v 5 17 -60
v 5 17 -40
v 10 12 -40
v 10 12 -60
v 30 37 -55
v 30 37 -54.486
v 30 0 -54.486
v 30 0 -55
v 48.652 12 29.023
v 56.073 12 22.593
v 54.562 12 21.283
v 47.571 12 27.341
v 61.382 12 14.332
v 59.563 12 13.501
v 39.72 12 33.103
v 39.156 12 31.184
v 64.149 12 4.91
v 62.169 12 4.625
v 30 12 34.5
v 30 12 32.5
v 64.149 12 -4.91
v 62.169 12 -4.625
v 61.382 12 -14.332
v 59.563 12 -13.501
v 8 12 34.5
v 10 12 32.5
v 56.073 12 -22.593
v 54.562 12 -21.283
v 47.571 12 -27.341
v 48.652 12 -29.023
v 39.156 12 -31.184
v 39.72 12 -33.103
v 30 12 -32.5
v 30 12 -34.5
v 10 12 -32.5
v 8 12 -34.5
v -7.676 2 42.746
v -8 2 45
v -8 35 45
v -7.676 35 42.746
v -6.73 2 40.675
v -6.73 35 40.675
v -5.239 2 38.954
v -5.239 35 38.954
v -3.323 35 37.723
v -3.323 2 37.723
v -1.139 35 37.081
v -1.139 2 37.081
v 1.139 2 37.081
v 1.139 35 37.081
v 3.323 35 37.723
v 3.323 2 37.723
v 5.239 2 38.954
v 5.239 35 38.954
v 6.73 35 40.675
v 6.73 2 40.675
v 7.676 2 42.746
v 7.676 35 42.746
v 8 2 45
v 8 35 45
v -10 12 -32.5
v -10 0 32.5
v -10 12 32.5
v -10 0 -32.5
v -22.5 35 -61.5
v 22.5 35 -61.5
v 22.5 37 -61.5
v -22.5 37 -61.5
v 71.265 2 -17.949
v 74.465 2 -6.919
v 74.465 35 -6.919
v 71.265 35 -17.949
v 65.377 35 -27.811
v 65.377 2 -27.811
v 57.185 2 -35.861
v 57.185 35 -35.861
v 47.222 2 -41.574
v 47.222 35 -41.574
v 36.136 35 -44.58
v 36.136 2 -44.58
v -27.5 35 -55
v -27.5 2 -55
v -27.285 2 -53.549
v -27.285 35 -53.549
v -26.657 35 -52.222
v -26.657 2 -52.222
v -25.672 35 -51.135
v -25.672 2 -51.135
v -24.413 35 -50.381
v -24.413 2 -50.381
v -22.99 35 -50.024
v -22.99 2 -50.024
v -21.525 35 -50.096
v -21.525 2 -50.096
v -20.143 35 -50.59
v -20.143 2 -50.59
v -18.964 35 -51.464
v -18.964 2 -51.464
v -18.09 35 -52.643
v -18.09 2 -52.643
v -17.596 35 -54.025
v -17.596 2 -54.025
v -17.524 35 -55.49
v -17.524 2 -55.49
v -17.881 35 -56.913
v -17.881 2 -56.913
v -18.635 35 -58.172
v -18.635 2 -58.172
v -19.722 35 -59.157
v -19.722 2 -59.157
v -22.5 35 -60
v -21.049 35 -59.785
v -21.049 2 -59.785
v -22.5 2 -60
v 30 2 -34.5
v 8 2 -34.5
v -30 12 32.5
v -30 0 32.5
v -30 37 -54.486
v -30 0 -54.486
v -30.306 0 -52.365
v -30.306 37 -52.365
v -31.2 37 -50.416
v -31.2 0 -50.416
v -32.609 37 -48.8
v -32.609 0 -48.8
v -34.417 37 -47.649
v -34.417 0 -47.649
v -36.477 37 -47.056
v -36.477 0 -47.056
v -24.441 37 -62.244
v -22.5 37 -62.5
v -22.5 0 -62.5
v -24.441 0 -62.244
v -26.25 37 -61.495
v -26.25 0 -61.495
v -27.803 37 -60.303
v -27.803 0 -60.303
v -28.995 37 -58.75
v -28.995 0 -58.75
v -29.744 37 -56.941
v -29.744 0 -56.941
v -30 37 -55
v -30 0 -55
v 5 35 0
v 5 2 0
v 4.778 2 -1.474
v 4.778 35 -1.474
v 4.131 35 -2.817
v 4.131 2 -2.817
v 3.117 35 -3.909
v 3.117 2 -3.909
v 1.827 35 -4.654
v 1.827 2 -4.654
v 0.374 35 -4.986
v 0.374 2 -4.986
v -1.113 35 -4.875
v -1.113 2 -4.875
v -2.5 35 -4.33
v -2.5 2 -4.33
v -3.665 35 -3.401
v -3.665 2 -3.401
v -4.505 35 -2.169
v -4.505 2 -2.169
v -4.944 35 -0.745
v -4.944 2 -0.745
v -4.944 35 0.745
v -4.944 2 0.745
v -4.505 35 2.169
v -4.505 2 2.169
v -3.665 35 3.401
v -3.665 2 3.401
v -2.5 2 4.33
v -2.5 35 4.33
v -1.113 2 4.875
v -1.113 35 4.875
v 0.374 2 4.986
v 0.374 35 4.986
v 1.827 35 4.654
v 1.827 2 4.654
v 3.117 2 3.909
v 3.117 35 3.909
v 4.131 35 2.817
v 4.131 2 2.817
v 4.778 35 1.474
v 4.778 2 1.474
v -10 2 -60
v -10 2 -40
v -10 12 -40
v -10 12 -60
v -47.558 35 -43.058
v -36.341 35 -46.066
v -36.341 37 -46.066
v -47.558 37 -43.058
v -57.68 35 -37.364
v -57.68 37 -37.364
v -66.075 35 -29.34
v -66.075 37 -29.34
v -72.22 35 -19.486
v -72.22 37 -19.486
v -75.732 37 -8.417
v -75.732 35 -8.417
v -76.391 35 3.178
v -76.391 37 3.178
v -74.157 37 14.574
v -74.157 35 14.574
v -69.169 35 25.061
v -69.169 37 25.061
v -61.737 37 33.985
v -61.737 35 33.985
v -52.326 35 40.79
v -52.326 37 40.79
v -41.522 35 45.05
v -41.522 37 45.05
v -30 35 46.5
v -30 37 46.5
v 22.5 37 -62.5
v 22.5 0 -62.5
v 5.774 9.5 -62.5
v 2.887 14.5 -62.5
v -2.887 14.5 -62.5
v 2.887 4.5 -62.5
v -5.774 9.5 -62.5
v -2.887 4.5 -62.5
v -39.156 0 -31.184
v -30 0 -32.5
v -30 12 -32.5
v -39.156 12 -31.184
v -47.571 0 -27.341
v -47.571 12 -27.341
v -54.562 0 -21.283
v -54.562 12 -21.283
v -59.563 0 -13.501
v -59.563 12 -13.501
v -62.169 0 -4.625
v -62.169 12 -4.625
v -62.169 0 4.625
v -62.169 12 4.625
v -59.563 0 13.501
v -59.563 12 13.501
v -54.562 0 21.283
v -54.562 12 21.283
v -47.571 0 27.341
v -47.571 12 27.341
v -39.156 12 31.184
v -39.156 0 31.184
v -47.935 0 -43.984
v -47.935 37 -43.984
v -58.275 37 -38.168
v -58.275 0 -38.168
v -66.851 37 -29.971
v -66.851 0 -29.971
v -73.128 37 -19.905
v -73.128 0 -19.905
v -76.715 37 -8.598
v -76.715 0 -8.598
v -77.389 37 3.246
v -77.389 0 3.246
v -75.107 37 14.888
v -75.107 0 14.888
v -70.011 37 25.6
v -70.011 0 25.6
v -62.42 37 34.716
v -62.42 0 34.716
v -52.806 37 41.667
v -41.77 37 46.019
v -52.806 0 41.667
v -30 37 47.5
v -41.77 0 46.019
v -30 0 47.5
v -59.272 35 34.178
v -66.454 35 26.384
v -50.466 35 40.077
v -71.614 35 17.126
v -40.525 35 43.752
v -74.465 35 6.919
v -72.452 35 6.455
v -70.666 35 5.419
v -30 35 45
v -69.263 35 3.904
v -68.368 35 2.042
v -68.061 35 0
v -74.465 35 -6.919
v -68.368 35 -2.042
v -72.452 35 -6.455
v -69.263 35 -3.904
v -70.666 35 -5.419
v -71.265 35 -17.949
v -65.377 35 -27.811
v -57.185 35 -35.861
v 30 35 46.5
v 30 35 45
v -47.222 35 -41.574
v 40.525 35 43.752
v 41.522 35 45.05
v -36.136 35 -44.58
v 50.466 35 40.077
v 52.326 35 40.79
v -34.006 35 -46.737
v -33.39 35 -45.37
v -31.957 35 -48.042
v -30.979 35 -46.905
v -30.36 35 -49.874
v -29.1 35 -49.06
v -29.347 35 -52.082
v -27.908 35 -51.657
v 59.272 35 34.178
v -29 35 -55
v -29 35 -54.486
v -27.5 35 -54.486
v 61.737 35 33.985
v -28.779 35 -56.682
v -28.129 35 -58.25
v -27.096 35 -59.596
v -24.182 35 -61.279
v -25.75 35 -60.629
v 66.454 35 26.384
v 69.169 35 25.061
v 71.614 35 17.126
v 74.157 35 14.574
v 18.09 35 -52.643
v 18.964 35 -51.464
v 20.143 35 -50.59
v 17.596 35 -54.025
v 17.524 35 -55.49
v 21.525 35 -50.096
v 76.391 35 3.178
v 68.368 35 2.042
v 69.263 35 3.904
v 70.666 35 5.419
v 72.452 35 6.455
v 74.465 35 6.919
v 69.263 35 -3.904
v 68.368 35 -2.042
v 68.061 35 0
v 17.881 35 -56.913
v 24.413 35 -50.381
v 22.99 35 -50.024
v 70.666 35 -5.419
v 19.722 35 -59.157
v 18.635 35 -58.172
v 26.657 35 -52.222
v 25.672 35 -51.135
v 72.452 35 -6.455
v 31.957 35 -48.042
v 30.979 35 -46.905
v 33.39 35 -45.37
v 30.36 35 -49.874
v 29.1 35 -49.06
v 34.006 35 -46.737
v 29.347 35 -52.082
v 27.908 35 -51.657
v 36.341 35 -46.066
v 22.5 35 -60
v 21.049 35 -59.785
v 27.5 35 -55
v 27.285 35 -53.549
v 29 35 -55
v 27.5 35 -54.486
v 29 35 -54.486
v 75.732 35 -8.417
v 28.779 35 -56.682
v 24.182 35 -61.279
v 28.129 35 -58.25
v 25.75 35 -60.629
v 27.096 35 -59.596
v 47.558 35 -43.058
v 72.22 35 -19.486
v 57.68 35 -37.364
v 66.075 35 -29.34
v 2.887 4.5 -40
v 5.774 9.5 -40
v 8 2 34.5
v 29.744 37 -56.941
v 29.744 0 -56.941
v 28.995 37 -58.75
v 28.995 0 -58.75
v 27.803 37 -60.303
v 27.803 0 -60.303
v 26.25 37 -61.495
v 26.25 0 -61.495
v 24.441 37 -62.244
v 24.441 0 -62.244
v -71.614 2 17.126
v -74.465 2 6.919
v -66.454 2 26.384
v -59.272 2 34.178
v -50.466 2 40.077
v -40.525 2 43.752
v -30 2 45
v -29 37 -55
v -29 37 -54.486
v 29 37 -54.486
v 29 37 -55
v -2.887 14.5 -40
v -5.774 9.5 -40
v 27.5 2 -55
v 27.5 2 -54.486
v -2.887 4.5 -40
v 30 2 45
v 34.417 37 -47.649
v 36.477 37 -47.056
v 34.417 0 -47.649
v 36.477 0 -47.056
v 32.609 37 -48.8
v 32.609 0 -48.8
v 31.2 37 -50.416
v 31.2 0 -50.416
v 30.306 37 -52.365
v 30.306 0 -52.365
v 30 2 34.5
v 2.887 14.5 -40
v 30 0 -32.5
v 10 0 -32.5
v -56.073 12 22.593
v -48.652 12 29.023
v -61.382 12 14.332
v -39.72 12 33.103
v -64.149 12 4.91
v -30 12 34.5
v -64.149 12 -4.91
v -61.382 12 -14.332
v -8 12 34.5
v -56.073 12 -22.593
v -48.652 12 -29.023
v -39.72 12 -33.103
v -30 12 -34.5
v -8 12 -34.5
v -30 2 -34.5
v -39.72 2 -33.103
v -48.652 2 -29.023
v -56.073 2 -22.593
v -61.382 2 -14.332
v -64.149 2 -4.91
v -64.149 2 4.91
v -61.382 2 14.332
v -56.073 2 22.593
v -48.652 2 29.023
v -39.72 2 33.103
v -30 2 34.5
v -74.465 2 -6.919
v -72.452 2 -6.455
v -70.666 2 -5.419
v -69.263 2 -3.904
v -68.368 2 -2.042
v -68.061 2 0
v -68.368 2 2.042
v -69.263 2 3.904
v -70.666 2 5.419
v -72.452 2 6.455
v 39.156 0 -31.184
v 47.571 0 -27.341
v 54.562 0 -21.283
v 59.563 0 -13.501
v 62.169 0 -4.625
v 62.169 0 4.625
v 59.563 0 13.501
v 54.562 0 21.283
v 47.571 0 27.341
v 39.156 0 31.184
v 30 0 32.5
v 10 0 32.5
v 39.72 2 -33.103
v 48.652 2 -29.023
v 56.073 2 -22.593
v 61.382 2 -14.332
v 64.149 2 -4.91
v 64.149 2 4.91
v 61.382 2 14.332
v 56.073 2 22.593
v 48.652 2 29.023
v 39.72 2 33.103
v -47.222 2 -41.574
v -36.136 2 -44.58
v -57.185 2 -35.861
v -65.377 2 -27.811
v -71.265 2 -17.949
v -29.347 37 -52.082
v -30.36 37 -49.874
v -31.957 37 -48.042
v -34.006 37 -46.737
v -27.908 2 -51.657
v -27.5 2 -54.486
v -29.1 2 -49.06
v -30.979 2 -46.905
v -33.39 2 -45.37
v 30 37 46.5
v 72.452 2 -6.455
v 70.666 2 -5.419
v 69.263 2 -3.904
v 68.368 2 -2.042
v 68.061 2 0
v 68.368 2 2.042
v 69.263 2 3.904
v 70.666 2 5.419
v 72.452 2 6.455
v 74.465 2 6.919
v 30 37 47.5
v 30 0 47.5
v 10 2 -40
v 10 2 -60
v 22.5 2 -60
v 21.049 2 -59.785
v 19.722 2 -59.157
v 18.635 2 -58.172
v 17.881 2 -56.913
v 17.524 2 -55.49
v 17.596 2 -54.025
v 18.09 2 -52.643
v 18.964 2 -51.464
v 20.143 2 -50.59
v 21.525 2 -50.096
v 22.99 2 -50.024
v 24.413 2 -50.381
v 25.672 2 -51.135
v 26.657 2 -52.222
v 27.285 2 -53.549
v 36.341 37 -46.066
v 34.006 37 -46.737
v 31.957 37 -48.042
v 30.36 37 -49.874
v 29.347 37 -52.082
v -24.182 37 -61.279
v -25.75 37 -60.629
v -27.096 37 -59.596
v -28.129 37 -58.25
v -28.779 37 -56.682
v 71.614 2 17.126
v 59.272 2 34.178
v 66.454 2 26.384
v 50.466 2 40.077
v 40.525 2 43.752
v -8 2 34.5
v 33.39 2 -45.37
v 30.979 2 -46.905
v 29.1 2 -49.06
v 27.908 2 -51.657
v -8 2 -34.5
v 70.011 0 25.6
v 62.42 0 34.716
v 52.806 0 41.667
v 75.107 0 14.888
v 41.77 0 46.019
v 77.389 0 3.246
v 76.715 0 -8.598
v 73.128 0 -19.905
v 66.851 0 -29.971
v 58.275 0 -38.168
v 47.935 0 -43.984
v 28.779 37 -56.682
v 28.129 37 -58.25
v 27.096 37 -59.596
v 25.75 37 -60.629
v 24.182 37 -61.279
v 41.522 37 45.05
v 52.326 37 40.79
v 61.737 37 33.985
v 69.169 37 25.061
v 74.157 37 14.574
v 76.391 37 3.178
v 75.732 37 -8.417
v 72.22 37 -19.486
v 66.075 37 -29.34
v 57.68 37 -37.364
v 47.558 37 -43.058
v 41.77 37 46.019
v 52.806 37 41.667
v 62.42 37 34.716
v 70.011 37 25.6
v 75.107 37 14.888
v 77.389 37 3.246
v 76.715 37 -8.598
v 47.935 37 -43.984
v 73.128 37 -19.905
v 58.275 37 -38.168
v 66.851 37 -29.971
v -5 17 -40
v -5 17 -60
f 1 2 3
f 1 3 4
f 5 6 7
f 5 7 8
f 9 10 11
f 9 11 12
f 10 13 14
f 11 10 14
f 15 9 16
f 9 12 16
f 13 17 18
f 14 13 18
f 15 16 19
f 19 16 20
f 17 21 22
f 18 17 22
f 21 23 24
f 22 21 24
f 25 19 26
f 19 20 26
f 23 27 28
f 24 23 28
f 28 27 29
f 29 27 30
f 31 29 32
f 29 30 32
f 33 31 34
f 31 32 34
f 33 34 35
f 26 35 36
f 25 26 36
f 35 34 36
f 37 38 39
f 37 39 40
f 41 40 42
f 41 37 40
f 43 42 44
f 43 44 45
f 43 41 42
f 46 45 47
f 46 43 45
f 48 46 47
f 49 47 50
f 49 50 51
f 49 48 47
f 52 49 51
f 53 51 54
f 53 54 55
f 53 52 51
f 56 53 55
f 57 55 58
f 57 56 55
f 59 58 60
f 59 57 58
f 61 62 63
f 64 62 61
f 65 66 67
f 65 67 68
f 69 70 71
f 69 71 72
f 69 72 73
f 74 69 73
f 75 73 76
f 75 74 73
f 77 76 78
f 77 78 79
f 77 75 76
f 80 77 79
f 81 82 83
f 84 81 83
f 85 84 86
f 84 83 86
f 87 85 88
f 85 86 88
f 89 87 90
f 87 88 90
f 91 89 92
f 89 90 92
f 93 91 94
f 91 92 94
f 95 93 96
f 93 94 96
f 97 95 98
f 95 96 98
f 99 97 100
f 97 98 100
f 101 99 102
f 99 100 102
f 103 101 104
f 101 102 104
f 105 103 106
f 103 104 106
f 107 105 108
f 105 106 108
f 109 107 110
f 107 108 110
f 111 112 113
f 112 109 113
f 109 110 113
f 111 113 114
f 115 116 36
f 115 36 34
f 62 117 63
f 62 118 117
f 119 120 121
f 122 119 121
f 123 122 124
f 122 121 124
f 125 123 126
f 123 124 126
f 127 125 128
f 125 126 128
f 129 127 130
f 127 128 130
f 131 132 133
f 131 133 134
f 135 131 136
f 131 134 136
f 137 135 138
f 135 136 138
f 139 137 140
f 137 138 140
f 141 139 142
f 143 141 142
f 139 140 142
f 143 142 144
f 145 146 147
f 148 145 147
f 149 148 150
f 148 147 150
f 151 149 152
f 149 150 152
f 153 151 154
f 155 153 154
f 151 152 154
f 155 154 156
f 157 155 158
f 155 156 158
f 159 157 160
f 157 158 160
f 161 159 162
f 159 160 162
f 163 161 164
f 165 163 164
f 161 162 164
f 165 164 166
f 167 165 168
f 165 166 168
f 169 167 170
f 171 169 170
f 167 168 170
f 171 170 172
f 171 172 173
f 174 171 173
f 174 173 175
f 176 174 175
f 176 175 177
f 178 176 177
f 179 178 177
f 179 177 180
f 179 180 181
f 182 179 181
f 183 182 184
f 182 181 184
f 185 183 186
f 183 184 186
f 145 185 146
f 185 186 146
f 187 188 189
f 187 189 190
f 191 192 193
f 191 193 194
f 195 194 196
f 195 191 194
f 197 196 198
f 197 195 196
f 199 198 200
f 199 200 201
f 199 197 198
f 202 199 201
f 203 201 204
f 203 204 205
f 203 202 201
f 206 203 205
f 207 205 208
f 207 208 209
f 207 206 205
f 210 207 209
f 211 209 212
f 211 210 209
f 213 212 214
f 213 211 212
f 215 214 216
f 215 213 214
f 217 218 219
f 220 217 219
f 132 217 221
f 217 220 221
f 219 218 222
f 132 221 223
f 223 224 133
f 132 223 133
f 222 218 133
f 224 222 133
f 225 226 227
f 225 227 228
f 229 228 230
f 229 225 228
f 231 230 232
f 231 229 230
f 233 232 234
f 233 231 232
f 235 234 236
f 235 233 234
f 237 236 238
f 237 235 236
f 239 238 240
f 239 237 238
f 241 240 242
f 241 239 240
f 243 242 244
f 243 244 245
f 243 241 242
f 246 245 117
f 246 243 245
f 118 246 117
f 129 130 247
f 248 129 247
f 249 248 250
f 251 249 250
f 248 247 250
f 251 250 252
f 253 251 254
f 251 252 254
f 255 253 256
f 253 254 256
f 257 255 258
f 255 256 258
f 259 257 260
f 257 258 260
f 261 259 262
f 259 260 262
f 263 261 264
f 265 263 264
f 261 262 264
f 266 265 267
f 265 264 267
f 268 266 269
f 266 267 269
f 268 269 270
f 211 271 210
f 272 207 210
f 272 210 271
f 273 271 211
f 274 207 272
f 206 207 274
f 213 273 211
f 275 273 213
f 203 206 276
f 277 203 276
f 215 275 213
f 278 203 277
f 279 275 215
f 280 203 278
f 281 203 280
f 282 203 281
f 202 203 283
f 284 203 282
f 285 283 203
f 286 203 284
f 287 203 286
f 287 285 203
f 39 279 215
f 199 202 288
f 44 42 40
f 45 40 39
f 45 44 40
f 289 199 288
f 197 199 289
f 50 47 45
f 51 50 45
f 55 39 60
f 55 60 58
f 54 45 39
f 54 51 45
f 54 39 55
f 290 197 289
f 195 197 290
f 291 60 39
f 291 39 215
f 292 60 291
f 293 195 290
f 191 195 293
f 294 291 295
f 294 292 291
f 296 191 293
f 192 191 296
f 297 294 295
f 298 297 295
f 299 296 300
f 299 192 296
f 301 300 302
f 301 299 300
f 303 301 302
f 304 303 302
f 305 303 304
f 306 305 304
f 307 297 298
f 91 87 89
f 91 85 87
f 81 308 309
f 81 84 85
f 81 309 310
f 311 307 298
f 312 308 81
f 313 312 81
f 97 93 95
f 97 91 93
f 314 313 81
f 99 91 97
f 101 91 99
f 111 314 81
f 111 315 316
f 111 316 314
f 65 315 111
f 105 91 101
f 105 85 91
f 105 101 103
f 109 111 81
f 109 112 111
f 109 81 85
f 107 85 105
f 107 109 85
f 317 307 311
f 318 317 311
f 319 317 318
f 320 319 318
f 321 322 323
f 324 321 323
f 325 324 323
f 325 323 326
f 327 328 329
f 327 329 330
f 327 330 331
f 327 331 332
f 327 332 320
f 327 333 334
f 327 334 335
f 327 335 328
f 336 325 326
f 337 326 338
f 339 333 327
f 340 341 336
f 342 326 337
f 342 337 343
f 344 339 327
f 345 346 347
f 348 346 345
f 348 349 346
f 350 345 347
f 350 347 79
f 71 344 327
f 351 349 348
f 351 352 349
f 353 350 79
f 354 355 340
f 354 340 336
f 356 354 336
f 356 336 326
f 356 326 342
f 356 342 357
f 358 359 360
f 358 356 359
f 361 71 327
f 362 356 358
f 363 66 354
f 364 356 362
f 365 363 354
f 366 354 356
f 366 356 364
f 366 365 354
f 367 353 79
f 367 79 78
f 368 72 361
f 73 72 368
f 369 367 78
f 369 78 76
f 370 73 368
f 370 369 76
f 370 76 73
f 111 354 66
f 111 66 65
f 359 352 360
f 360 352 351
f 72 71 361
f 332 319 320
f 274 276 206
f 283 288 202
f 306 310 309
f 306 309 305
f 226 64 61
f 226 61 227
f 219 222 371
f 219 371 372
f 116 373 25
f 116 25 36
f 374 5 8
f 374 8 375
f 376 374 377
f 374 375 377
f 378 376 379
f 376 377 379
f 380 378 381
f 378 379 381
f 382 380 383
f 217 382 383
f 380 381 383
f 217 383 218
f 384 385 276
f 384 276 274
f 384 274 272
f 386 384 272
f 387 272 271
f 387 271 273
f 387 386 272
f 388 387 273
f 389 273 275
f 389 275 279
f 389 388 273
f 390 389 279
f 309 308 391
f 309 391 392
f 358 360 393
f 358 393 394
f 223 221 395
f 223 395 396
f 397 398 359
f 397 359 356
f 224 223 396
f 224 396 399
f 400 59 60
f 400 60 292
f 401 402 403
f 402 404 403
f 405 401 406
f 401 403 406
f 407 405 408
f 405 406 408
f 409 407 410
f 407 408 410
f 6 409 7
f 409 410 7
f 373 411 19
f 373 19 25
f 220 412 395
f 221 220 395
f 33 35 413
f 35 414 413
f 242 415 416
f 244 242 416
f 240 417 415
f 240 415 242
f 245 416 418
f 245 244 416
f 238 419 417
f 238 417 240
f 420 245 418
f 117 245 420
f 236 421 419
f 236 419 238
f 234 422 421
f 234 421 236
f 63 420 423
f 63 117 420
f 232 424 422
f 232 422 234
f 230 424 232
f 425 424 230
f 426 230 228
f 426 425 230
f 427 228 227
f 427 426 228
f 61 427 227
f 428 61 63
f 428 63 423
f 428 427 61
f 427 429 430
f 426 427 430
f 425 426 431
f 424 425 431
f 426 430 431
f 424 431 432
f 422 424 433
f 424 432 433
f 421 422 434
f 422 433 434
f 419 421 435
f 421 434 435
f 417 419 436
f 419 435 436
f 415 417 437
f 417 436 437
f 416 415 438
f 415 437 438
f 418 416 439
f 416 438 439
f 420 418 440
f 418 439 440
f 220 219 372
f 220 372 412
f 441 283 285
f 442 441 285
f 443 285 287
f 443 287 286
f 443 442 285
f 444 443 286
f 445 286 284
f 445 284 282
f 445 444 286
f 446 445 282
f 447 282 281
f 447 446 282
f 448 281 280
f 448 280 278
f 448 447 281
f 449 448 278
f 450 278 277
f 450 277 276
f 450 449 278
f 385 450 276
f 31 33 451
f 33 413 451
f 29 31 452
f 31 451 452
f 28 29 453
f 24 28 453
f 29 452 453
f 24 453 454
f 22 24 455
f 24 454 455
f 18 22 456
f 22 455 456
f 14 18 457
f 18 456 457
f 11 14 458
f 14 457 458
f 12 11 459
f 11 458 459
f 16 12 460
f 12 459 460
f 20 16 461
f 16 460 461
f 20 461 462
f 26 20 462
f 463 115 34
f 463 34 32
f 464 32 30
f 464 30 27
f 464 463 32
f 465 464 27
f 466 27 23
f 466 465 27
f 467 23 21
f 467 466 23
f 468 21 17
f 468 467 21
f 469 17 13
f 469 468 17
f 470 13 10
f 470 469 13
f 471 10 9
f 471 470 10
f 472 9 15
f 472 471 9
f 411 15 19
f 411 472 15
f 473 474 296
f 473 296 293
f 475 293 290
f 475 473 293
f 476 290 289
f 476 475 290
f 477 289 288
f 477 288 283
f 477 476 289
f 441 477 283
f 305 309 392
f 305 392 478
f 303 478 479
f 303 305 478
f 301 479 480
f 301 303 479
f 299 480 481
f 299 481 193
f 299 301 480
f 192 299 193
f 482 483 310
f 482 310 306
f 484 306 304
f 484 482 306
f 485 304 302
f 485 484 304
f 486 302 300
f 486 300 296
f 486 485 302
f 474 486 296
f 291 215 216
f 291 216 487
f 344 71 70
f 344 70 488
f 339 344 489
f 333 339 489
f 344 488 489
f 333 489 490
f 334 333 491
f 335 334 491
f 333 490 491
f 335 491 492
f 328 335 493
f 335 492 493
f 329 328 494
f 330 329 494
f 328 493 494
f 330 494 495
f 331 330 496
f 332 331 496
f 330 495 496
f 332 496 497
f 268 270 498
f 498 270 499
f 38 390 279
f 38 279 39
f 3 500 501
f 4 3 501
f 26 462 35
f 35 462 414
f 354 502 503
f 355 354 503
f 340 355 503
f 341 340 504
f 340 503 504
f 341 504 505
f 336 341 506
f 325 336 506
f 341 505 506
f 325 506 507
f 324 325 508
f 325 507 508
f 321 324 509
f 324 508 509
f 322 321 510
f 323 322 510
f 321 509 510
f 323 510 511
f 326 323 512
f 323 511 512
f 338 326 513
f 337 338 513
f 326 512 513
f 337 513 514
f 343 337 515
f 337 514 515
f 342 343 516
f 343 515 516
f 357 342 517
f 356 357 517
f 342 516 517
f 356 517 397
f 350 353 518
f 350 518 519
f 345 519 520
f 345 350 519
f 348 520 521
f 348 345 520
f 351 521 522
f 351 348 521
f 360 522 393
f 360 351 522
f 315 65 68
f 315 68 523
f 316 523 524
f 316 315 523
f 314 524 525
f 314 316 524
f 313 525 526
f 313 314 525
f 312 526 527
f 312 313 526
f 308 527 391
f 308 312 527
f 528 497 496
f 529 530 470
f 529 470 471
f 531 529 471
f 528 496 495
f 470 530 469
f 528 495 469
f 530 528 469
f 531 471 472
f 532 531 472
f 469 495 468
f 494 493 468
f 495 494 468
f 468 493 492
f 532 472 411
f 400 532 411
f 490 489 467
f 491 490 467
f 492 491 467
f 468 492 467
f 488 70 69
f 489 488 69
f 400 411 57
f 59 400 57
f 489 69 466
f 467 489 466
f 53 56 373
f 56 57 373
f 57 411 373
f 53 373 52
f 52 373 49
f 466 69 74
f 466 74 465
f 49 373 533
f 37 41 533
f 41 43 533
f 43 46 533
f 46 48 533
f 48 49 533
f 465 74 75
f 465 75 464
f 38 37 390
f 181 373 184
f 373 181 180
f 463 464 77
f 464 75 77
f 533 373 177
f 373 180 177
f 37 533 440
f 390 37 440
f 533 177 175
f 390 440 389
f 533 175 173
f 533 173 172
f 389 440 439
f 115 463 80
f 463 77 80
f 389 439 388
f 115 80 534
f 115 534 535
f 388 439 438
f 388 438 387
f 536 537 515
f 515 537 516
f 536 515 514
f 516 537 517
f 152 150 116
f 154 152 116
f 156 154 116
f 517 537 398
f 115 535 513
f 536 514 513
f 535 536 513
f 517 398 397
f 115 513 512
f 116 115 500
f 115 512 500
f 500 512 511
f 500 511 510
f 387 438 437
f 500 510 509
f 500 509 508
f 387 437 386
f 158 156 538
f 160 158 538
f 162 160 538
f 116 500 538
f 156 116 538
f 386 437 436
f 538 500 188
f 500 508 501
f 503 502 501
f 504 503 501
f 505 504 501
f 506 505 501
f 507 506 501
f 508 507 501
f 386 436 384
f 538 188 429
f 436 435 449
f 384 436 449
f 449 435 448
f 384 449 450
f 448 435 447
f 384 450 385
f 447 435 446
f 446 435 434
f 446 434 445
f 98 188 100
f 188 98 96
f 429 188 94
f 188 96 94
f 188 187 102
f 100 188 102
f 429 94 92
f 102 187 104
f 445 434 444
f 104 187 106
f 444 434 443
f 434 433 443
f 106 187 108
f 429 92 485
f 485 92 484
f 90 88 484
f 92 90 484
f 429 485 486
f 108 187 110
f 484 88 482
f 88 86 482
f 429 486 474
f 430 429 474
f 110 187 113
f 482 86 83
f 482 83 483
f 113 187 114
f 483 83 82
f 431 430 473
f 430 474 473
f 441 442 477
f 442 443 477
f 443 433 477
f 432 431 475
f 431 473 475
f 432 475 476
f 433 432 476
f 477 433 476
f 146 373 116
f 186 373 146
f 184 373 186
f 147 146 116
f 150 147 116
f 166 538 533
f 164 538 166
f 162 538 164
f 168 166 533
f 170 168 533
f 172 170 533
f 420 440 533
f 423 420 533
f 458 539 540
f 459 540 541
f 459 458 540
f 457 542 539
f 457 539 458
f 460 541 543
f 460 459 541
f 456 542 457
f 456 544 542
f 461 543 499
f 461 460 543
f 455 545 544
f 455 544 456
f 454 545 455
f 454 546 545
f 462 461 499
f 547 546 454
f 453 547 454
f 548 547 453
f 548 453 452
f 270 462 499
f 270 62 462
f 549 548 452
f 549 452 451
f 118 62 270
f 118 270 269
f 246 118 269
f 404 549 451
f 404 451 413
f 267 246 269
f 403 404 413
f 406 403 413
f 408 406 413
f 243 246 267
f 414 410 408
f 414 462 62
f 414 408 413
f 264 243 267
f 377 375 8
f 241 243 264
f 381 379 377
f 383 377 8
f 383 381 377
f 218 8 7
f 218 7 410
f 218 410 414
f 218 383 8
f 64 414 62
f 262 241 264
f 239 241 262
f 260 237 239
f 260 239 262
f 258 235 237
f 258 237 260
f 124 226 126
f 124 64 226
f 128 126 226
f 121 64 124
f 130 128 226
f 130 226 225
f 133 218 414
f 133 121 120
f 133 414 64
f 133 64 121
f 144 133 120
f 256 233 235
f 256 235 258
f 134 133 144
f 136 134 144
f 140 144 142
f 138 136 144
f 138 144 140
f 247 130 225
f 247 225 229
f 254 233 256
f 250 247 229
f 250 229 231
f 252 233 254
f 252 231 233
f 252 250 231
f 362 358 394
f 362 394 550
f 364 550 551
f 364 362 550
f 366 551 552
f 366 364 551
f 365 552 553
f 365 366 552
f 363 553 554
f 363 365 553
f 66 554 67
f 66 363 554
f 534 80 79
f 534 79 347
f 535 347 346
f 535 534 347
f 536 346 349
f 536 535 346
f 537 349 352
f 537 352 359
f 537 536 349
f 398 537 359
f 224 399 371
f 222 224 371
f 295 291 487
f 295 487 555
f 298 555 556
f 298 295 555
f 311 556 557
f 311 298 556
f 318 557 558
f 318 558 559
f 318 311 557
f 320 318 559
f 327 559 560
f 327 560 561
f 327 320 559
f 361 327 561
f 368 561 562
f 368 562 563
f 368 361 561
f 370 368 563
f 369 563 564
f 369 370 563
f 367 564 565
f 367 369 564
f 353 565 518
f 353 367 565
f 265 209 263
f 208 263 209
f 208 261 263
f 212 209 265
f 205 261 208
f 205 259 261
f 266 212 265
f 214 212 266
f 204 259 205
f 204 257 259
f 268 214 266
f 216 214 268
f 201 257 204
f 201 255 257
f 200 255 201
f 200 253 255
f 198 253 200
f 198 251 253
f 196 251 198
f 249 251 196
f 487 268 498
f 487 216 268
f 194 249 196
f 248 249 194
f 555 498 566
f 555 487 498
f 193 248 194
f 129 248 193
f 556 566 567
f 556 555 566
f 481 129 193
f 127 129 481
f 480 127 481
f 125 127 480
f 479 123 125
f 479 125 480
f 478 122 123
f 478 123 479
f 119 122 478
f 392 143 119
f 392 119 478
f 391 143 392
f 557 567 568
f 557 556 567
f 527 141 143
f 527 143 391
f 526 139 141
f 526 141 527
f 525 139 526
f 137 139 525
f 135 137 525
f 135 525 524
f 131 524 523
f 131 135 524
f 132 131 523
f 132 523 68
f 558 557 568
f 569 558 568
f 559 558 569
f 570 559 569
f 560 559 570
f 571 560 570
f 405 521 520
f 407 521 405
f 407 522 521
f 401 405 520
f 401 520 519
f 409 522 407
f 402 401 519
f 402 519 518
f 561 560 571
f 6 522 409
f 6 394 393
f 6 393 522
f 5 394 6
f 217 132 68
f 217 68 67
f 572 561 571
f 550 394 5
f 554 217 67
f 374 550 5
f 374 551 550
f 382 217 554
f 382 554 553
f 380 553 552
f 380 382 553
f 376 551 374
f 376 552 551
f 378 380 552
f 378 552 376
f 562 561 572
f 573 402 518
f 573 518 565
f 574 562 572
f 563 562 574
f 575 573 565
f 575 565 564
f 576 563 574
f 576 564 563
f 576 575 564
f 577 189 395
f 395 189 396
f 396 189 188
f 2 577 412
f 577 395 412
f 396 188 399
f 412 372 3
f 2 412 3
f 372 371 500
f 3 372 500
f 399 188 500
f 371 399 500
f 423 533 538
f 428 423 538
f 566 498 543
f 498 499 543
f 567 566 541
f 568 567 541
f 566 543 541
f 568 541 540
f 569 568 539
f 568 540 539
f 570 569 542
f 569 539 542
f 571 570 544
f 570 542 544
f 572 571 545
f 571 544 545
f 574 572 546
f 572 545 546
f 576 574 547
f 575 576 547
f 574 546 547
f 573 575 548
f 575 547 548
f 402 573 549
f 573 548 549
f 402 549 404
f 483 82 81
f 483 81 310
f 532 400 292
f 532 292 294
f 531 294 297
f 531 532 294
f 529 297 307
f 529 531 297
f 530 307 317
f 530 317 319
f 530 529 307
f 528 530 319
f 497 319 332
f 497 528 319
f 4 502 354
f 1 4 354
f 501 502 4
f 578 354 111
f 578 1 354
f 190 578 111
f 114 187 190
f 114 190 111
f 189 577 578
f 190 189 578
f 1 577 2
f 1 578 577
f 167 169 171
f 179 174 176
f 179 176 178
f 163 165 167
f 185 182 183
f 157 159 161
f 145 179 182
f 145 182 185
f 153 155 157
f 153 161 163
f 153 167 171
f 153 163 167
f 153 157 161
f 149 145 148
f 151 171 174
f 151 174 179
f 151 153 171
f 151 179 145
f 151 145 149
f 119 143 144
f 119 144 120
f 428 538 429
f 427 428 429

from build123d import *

# Parameters (mm, degrees)
BOSS_EXTRUDE1_DEPTH = 2
EXTRUDE_THIN1_DEPTH = 35
EXTRUDE_THIN3_DEPTH = 10
EXTRUDE_THIN4_DEPTH = 33
BOSS_EXTRUDE4_DEPTH = 33
BOSS_EXTRUDE5_DEPTH = 33
SKETCH12_R          = 5
BOSS_EXTRUDE7_DEPTH = 33
SKETCH13_W          = 20
SKETCH13_H          = 20
BOSS_EXTRUDE8_DEPTH = 15
CUT_EXTRUDE1_DEPTH  = 28
CHAMFER2_SIZE       = 5
SKETCH17_R          = 5
BOSS_EXTRUDE9_DEPTH = 33


with BuildPart() as part:
    # Sketch1 → Boss-Extrude1 (new body)
    with BuildSketch(Plane(origin=(0, 0, 0), x_dir=(1, 0, 0), z_dir=(0, 1, 0))):
        with BuildLine():
            Line((-30, 54.486236794), (-30, 55))
            ThreePointArc((-30, 55), (-27.803300859, 60.303300859), (-22.5, 62.5))
            Line((-22.5, 62.5), (22.5, 62.5))
            ThreePointArc((22.5, 62.5), (27.803300859, 60.303300859), (30, 55))
            Line((30, 55), (30, 54.486236794))
            ThreePointArc((30, 54.486236794), (31.846662289, 49.557771239), (36.477272727, 47.056295413))
            ThreePointArc((36.477272727, 47.056295413), (77.388944028, -3.246226107), (30, -47.5))
            Line((30, -47.5), (-30, -47.5))
            ThreePointArc((-30, -47.5), (-77.388944028, -3.246226107), (-36.477272727, 47.056295413))
            ThreePointArc((-36.477272727, 47.056295413), (-31.846662289, 49.557771239), (-30, 54.486236794))
        make_face()
        with BuildLine():
            Line((-30, 32.5), (-10, 32.5))
            Line((-10, 32.5), (-10, -32.5))
            Line((-10, -32.5), (-30, -32.5))
            ThreePointArc((-30, -32.5), (-62.5, 0), (-30, 32.5))
        make_face(mode=Mode.SUBTRACT)
        with BuildLine():
            Line((10, 32.5), (30, 32.5))
            ThreePointArc((30, 32.5), (62.5, 0), (30, -32.5))
            Line((30, -32.5), (10, -32.5))
            Line((10, -32.5), (10, 32.5))
        make_face(mode=Mode.SUBTRACT)
    extrude(amount=BOSS_EXTRUDE1_DEPTH)

    # Sketch2 → Extrude-Thin1 (add)
    with BuildSketch(Plane(origin=(0, 2, 0), x_dir=(1, 0, 0), z_dir=(0, 1, 0))):
        with BuildLine():
            Line((-30, -47.5), (30, -47.5))
            ThreePointArc((30, -47.5), (77.388944028, -3.246226107), (36.477272727, 47.056295413))
            ThreePointArc((36.477272727, 47.056295413), (31.846662289, 49.557771239), (30, 54.486236794))
            Line((30, 54.486236794), (30, 55))
            ThreePointArc((30, 55), (27.803300859, 60.303300859), (22.5, 62.5))
            Line((22.5, 62.5), (-22.5, 62.5))
            ThreePointArc((-22.5, 62.5), (-27.803300859, 60.303300859), (-30, 55))
            Line((-30, 55), (-30, 54.486236794))
            ThreePointArc((-30, 54.486236794), (-31.846662289, 49.557771239), (-36.477272727, 47.056295413))
            ThreePointArc((-36.477272727, 47.056295413), (-77.388944028, -3.246226107), (-30, -47.5))
        make_face()
        with BuildLine():
            Line((-30, -46.5), (30, -46.5))
            ThreePointArc((30, -46.5), (76.391282048, -3.177884504), (36.340909091, 46.065636562))
            ThreePointArc((36.340909091, 46.065636562), (31.092883928, 48.900642499), (29, 54.486236794))
            Line((29, 54.486236794), (29, 55))
            ThreePointArc((29, 55), (27.096194078, 59.596194078), (22.5, 61.5))
            Line((22.5, 61.5), (-22.5, 61.5))
            ThreePointArc((-22.5, 61.5), (-27.096194078, 59.596194078), (-29, 55))
            Line((-29, 55), (-29, 54.486236794))
            ThreePointArc((-29, 54.486236794), (-31.092883928, 48.900642499), (-36.340909091, 46.065636562))
            ThreePointArc((-36.340909091, 46.065636562), (-76.391282048, -3.177884504), (-30, -46.5))
        make_face(mode=Mode.SUBTRACT)
    extrude(amount=EXTRUDE_THIN1_DEPTH)

    # Sketch5 → Extrude-Thin3 (add)
    with BuildSketch(Plane(origin=(0, 2, 0), x_dir=(1, 0, 0), z_dir=(0, 1, 0))):
        with BuildLine():
            Line((30, -34.5), (8, -34.5))
            Line((8, -34.5), (8, 34.5))
            Line((8, 34.5), (30, 34.5))
            ThreePointArc((30, 34.5), (64.5, 0), (30, -34.5))
        make_face()
        with BuildLine():
            Line((30, -32.5), (10, -32.5))
            Line((10, -32.5), (10, 32.5))
            Line((10, 32.5), (30, 32.5))
            ThreePointArc((30, 32.5), (62.5, 0), (30, -32.5))
        make_face(mode=Mode.SUBTRACT)
    extrude_thin3 = extrude(amount=EXTRUDE_THIN3_DEPTH)

    # Mirror1: Extrude-Thin3 across plane
    add(extrude_thin3.mirror(Plane(origin=(0, 0, 0), x_dir=(0, 0, 1), z_dir=(1, 0, 0))))

    # Sketch6 → Extrude-Thin4 (add)
    with BuildSketch(Plane(origin=(0, 2, 0), x_dir=(1, 0, 0), z_dir=(0, 1, 0))):
        with BuildLine():
            Line((-30, -46.5), (30, -46.5))
            ThreePointArc((30, -46.5), (76.391282048, -3.177884504), (36.340909091, 46.065636562))
            ThreePointArc((36.340909091, 46.065636562), (31.092883928, 48.900642499), (29, 54.486236794))
            Line((29, 54.486236794), (29, 55))
            ThreePointArc((29, 55), (27.096194078, 59.596194078), (22.5, 61.5))
            Line((22.5, 61.5), (-22.5, 61.5))
            ThreePointArc((-22.5, 61.5), (-27.096194078, 59.596194078), (-29, 55))
            Line((-29, 55), (-29, 54.486236794))
            ThreePointArc((-29, 54.486236794), (-31.092883928, 48.900642499), (-36.340909091, 46.065636562))
            ThreePointArc((-36.340909091, 46.065636562), (-76.391282048, -3.177884504), (-30, -46.5))
        make_face()
        with BuildLine():
            Line((-30, -45), (30, -45))
            ThreePointArc((30, -45), (74.894789079, -3.075372101), (36.136363636, 44.579648286))
            ThreePointArc((36.136363636, 44.579648286), (29.962216386, 47.914949388), (27.5, 54.486236794))
            Line((27.5, 54.486236794), (27.5, 55))
            ThreePointArc((27.5, 55), (26.035533906, 58.535533906), (22.5, 60))
            Line((22.5, 60), (-22.5, 60))
            ThreePointArc((-22.5, 60), (-26.035533906, 58.535533906), (-27.5, 55))
            Line((-27.5, 55), (-27.5, 54.486236794))
            ThreePointArc((-27.5, 54.486236794), (-29.962216386, 47.914949388), (-36.136363636, 44.579648286))
            ThreePointArc((-36.136363636, 44.579648286), (-74.894789079, -3.075372101), (-30, -45))
        make_face(mode=Mode.SUBTRACT)
    extrude(amount=EXTRUDE_THIN4_DEPTH)

    # Sketch8 → Boss-Extrude4 (add)
    with BuildSketch(Plane(origin=(0, 2, 0), x_dir=(1, 0, 0), z_dir=(0, 1, 0))):
        with BuildLine():
            ThreePointArc((-74.464958868, 6.918629407), (-68.060713157, 0), (-74.464958868, -6.918629407))
            ThreePointArc((-74.464958868, -6.918629407), (-75, 0), (-74.464958868, 6.918629407))
        make_face()
    boss_extrude4 = extrude(amount=BOSS_EXTRUDE4_DEPTH)

    # Mirror2: Boss-Extrude4 across plane
    add(boss_extrude4.mirror(Plane(origin=(0, 0, 0), x_dir=(0, 0, 1), z_dir=(1, 0, 0))))

    # Sketch9 → Boss-Extrude5 (add)
    with BuildSketch(Plane(origin=(0, 2, 0), x_dir=(1, 0, 0), z_dir=(0, 1, 0))):
        with BuildLine():
            Line((8, -45), (-8, -45))
            ThreePointArc((-8, -45), (0, -37), (8, -45))
        make_face()
    extrude(amount=BOSS_EXTRUDE5_DEPTH)

    # Sketch12 → Boss-Extrude7 (add)
    with BuildSketch(Plane(origin=(0, 2, 0), x_dir=(1, 0, 0), z_dir=(0, 1, 0))):
        with Locations((-22.5, 55)):
            Circle(SKETCH12_R)
        with Locations((22.5, 55)):
            Circle(SKETCH12_R)
    extrude(amount=BOSS_EXTRUDE7_DEPTH)

    # Sketch13 → Boss-Extrude8 (add)
    with BuildSketch(Plane(origin=(0, 2, 0), x_dir=(1, 0, 0), z_dir=(0, 1, 0))):
        with Locations((0, 50)):
            Rectangle(SKETCH13_W, SKETCH13_H)
    extrude(amount=BOSS_EXTRUDE8_DEPTH)

    # Sketch14 → Cut-Extrude1 (cut)
    with BuildSketch(Plane.XY.offset(-40)):
        Polygon((5.773502692, 9.5), (2.886751346, 14.5), (-2.886751346, 14.5), (-5.773502692, 9.5), (-2.886751346, 4.5), (2.886751346, 4.5), align=None)
    extrude(amount=-CUT_EXTRUDE1_DEPTH, mode=Mode.SUBTRACT)

    # Chamfer2
    chamfer2_edges = [part.edges().sort_by_distance(p)[0] for p in [
        (10, 17, -50),
        (-10, 17, -50),
    ]]
    chamfer(chamfer2_edges, length=CHAMFER2_SIZE)

    # Sketch17 → Boss-Extrude9 (add)
    with BuildSketch(Plane(origin=(0, 2, 0), x_dir=(1, 0, 0), z_dir=(0, 1, 0))):
        Circle(SKETCH17_R)
    extrude(amount=BOSS_EXTRUDE9_DEPTH)


solid = part.part
